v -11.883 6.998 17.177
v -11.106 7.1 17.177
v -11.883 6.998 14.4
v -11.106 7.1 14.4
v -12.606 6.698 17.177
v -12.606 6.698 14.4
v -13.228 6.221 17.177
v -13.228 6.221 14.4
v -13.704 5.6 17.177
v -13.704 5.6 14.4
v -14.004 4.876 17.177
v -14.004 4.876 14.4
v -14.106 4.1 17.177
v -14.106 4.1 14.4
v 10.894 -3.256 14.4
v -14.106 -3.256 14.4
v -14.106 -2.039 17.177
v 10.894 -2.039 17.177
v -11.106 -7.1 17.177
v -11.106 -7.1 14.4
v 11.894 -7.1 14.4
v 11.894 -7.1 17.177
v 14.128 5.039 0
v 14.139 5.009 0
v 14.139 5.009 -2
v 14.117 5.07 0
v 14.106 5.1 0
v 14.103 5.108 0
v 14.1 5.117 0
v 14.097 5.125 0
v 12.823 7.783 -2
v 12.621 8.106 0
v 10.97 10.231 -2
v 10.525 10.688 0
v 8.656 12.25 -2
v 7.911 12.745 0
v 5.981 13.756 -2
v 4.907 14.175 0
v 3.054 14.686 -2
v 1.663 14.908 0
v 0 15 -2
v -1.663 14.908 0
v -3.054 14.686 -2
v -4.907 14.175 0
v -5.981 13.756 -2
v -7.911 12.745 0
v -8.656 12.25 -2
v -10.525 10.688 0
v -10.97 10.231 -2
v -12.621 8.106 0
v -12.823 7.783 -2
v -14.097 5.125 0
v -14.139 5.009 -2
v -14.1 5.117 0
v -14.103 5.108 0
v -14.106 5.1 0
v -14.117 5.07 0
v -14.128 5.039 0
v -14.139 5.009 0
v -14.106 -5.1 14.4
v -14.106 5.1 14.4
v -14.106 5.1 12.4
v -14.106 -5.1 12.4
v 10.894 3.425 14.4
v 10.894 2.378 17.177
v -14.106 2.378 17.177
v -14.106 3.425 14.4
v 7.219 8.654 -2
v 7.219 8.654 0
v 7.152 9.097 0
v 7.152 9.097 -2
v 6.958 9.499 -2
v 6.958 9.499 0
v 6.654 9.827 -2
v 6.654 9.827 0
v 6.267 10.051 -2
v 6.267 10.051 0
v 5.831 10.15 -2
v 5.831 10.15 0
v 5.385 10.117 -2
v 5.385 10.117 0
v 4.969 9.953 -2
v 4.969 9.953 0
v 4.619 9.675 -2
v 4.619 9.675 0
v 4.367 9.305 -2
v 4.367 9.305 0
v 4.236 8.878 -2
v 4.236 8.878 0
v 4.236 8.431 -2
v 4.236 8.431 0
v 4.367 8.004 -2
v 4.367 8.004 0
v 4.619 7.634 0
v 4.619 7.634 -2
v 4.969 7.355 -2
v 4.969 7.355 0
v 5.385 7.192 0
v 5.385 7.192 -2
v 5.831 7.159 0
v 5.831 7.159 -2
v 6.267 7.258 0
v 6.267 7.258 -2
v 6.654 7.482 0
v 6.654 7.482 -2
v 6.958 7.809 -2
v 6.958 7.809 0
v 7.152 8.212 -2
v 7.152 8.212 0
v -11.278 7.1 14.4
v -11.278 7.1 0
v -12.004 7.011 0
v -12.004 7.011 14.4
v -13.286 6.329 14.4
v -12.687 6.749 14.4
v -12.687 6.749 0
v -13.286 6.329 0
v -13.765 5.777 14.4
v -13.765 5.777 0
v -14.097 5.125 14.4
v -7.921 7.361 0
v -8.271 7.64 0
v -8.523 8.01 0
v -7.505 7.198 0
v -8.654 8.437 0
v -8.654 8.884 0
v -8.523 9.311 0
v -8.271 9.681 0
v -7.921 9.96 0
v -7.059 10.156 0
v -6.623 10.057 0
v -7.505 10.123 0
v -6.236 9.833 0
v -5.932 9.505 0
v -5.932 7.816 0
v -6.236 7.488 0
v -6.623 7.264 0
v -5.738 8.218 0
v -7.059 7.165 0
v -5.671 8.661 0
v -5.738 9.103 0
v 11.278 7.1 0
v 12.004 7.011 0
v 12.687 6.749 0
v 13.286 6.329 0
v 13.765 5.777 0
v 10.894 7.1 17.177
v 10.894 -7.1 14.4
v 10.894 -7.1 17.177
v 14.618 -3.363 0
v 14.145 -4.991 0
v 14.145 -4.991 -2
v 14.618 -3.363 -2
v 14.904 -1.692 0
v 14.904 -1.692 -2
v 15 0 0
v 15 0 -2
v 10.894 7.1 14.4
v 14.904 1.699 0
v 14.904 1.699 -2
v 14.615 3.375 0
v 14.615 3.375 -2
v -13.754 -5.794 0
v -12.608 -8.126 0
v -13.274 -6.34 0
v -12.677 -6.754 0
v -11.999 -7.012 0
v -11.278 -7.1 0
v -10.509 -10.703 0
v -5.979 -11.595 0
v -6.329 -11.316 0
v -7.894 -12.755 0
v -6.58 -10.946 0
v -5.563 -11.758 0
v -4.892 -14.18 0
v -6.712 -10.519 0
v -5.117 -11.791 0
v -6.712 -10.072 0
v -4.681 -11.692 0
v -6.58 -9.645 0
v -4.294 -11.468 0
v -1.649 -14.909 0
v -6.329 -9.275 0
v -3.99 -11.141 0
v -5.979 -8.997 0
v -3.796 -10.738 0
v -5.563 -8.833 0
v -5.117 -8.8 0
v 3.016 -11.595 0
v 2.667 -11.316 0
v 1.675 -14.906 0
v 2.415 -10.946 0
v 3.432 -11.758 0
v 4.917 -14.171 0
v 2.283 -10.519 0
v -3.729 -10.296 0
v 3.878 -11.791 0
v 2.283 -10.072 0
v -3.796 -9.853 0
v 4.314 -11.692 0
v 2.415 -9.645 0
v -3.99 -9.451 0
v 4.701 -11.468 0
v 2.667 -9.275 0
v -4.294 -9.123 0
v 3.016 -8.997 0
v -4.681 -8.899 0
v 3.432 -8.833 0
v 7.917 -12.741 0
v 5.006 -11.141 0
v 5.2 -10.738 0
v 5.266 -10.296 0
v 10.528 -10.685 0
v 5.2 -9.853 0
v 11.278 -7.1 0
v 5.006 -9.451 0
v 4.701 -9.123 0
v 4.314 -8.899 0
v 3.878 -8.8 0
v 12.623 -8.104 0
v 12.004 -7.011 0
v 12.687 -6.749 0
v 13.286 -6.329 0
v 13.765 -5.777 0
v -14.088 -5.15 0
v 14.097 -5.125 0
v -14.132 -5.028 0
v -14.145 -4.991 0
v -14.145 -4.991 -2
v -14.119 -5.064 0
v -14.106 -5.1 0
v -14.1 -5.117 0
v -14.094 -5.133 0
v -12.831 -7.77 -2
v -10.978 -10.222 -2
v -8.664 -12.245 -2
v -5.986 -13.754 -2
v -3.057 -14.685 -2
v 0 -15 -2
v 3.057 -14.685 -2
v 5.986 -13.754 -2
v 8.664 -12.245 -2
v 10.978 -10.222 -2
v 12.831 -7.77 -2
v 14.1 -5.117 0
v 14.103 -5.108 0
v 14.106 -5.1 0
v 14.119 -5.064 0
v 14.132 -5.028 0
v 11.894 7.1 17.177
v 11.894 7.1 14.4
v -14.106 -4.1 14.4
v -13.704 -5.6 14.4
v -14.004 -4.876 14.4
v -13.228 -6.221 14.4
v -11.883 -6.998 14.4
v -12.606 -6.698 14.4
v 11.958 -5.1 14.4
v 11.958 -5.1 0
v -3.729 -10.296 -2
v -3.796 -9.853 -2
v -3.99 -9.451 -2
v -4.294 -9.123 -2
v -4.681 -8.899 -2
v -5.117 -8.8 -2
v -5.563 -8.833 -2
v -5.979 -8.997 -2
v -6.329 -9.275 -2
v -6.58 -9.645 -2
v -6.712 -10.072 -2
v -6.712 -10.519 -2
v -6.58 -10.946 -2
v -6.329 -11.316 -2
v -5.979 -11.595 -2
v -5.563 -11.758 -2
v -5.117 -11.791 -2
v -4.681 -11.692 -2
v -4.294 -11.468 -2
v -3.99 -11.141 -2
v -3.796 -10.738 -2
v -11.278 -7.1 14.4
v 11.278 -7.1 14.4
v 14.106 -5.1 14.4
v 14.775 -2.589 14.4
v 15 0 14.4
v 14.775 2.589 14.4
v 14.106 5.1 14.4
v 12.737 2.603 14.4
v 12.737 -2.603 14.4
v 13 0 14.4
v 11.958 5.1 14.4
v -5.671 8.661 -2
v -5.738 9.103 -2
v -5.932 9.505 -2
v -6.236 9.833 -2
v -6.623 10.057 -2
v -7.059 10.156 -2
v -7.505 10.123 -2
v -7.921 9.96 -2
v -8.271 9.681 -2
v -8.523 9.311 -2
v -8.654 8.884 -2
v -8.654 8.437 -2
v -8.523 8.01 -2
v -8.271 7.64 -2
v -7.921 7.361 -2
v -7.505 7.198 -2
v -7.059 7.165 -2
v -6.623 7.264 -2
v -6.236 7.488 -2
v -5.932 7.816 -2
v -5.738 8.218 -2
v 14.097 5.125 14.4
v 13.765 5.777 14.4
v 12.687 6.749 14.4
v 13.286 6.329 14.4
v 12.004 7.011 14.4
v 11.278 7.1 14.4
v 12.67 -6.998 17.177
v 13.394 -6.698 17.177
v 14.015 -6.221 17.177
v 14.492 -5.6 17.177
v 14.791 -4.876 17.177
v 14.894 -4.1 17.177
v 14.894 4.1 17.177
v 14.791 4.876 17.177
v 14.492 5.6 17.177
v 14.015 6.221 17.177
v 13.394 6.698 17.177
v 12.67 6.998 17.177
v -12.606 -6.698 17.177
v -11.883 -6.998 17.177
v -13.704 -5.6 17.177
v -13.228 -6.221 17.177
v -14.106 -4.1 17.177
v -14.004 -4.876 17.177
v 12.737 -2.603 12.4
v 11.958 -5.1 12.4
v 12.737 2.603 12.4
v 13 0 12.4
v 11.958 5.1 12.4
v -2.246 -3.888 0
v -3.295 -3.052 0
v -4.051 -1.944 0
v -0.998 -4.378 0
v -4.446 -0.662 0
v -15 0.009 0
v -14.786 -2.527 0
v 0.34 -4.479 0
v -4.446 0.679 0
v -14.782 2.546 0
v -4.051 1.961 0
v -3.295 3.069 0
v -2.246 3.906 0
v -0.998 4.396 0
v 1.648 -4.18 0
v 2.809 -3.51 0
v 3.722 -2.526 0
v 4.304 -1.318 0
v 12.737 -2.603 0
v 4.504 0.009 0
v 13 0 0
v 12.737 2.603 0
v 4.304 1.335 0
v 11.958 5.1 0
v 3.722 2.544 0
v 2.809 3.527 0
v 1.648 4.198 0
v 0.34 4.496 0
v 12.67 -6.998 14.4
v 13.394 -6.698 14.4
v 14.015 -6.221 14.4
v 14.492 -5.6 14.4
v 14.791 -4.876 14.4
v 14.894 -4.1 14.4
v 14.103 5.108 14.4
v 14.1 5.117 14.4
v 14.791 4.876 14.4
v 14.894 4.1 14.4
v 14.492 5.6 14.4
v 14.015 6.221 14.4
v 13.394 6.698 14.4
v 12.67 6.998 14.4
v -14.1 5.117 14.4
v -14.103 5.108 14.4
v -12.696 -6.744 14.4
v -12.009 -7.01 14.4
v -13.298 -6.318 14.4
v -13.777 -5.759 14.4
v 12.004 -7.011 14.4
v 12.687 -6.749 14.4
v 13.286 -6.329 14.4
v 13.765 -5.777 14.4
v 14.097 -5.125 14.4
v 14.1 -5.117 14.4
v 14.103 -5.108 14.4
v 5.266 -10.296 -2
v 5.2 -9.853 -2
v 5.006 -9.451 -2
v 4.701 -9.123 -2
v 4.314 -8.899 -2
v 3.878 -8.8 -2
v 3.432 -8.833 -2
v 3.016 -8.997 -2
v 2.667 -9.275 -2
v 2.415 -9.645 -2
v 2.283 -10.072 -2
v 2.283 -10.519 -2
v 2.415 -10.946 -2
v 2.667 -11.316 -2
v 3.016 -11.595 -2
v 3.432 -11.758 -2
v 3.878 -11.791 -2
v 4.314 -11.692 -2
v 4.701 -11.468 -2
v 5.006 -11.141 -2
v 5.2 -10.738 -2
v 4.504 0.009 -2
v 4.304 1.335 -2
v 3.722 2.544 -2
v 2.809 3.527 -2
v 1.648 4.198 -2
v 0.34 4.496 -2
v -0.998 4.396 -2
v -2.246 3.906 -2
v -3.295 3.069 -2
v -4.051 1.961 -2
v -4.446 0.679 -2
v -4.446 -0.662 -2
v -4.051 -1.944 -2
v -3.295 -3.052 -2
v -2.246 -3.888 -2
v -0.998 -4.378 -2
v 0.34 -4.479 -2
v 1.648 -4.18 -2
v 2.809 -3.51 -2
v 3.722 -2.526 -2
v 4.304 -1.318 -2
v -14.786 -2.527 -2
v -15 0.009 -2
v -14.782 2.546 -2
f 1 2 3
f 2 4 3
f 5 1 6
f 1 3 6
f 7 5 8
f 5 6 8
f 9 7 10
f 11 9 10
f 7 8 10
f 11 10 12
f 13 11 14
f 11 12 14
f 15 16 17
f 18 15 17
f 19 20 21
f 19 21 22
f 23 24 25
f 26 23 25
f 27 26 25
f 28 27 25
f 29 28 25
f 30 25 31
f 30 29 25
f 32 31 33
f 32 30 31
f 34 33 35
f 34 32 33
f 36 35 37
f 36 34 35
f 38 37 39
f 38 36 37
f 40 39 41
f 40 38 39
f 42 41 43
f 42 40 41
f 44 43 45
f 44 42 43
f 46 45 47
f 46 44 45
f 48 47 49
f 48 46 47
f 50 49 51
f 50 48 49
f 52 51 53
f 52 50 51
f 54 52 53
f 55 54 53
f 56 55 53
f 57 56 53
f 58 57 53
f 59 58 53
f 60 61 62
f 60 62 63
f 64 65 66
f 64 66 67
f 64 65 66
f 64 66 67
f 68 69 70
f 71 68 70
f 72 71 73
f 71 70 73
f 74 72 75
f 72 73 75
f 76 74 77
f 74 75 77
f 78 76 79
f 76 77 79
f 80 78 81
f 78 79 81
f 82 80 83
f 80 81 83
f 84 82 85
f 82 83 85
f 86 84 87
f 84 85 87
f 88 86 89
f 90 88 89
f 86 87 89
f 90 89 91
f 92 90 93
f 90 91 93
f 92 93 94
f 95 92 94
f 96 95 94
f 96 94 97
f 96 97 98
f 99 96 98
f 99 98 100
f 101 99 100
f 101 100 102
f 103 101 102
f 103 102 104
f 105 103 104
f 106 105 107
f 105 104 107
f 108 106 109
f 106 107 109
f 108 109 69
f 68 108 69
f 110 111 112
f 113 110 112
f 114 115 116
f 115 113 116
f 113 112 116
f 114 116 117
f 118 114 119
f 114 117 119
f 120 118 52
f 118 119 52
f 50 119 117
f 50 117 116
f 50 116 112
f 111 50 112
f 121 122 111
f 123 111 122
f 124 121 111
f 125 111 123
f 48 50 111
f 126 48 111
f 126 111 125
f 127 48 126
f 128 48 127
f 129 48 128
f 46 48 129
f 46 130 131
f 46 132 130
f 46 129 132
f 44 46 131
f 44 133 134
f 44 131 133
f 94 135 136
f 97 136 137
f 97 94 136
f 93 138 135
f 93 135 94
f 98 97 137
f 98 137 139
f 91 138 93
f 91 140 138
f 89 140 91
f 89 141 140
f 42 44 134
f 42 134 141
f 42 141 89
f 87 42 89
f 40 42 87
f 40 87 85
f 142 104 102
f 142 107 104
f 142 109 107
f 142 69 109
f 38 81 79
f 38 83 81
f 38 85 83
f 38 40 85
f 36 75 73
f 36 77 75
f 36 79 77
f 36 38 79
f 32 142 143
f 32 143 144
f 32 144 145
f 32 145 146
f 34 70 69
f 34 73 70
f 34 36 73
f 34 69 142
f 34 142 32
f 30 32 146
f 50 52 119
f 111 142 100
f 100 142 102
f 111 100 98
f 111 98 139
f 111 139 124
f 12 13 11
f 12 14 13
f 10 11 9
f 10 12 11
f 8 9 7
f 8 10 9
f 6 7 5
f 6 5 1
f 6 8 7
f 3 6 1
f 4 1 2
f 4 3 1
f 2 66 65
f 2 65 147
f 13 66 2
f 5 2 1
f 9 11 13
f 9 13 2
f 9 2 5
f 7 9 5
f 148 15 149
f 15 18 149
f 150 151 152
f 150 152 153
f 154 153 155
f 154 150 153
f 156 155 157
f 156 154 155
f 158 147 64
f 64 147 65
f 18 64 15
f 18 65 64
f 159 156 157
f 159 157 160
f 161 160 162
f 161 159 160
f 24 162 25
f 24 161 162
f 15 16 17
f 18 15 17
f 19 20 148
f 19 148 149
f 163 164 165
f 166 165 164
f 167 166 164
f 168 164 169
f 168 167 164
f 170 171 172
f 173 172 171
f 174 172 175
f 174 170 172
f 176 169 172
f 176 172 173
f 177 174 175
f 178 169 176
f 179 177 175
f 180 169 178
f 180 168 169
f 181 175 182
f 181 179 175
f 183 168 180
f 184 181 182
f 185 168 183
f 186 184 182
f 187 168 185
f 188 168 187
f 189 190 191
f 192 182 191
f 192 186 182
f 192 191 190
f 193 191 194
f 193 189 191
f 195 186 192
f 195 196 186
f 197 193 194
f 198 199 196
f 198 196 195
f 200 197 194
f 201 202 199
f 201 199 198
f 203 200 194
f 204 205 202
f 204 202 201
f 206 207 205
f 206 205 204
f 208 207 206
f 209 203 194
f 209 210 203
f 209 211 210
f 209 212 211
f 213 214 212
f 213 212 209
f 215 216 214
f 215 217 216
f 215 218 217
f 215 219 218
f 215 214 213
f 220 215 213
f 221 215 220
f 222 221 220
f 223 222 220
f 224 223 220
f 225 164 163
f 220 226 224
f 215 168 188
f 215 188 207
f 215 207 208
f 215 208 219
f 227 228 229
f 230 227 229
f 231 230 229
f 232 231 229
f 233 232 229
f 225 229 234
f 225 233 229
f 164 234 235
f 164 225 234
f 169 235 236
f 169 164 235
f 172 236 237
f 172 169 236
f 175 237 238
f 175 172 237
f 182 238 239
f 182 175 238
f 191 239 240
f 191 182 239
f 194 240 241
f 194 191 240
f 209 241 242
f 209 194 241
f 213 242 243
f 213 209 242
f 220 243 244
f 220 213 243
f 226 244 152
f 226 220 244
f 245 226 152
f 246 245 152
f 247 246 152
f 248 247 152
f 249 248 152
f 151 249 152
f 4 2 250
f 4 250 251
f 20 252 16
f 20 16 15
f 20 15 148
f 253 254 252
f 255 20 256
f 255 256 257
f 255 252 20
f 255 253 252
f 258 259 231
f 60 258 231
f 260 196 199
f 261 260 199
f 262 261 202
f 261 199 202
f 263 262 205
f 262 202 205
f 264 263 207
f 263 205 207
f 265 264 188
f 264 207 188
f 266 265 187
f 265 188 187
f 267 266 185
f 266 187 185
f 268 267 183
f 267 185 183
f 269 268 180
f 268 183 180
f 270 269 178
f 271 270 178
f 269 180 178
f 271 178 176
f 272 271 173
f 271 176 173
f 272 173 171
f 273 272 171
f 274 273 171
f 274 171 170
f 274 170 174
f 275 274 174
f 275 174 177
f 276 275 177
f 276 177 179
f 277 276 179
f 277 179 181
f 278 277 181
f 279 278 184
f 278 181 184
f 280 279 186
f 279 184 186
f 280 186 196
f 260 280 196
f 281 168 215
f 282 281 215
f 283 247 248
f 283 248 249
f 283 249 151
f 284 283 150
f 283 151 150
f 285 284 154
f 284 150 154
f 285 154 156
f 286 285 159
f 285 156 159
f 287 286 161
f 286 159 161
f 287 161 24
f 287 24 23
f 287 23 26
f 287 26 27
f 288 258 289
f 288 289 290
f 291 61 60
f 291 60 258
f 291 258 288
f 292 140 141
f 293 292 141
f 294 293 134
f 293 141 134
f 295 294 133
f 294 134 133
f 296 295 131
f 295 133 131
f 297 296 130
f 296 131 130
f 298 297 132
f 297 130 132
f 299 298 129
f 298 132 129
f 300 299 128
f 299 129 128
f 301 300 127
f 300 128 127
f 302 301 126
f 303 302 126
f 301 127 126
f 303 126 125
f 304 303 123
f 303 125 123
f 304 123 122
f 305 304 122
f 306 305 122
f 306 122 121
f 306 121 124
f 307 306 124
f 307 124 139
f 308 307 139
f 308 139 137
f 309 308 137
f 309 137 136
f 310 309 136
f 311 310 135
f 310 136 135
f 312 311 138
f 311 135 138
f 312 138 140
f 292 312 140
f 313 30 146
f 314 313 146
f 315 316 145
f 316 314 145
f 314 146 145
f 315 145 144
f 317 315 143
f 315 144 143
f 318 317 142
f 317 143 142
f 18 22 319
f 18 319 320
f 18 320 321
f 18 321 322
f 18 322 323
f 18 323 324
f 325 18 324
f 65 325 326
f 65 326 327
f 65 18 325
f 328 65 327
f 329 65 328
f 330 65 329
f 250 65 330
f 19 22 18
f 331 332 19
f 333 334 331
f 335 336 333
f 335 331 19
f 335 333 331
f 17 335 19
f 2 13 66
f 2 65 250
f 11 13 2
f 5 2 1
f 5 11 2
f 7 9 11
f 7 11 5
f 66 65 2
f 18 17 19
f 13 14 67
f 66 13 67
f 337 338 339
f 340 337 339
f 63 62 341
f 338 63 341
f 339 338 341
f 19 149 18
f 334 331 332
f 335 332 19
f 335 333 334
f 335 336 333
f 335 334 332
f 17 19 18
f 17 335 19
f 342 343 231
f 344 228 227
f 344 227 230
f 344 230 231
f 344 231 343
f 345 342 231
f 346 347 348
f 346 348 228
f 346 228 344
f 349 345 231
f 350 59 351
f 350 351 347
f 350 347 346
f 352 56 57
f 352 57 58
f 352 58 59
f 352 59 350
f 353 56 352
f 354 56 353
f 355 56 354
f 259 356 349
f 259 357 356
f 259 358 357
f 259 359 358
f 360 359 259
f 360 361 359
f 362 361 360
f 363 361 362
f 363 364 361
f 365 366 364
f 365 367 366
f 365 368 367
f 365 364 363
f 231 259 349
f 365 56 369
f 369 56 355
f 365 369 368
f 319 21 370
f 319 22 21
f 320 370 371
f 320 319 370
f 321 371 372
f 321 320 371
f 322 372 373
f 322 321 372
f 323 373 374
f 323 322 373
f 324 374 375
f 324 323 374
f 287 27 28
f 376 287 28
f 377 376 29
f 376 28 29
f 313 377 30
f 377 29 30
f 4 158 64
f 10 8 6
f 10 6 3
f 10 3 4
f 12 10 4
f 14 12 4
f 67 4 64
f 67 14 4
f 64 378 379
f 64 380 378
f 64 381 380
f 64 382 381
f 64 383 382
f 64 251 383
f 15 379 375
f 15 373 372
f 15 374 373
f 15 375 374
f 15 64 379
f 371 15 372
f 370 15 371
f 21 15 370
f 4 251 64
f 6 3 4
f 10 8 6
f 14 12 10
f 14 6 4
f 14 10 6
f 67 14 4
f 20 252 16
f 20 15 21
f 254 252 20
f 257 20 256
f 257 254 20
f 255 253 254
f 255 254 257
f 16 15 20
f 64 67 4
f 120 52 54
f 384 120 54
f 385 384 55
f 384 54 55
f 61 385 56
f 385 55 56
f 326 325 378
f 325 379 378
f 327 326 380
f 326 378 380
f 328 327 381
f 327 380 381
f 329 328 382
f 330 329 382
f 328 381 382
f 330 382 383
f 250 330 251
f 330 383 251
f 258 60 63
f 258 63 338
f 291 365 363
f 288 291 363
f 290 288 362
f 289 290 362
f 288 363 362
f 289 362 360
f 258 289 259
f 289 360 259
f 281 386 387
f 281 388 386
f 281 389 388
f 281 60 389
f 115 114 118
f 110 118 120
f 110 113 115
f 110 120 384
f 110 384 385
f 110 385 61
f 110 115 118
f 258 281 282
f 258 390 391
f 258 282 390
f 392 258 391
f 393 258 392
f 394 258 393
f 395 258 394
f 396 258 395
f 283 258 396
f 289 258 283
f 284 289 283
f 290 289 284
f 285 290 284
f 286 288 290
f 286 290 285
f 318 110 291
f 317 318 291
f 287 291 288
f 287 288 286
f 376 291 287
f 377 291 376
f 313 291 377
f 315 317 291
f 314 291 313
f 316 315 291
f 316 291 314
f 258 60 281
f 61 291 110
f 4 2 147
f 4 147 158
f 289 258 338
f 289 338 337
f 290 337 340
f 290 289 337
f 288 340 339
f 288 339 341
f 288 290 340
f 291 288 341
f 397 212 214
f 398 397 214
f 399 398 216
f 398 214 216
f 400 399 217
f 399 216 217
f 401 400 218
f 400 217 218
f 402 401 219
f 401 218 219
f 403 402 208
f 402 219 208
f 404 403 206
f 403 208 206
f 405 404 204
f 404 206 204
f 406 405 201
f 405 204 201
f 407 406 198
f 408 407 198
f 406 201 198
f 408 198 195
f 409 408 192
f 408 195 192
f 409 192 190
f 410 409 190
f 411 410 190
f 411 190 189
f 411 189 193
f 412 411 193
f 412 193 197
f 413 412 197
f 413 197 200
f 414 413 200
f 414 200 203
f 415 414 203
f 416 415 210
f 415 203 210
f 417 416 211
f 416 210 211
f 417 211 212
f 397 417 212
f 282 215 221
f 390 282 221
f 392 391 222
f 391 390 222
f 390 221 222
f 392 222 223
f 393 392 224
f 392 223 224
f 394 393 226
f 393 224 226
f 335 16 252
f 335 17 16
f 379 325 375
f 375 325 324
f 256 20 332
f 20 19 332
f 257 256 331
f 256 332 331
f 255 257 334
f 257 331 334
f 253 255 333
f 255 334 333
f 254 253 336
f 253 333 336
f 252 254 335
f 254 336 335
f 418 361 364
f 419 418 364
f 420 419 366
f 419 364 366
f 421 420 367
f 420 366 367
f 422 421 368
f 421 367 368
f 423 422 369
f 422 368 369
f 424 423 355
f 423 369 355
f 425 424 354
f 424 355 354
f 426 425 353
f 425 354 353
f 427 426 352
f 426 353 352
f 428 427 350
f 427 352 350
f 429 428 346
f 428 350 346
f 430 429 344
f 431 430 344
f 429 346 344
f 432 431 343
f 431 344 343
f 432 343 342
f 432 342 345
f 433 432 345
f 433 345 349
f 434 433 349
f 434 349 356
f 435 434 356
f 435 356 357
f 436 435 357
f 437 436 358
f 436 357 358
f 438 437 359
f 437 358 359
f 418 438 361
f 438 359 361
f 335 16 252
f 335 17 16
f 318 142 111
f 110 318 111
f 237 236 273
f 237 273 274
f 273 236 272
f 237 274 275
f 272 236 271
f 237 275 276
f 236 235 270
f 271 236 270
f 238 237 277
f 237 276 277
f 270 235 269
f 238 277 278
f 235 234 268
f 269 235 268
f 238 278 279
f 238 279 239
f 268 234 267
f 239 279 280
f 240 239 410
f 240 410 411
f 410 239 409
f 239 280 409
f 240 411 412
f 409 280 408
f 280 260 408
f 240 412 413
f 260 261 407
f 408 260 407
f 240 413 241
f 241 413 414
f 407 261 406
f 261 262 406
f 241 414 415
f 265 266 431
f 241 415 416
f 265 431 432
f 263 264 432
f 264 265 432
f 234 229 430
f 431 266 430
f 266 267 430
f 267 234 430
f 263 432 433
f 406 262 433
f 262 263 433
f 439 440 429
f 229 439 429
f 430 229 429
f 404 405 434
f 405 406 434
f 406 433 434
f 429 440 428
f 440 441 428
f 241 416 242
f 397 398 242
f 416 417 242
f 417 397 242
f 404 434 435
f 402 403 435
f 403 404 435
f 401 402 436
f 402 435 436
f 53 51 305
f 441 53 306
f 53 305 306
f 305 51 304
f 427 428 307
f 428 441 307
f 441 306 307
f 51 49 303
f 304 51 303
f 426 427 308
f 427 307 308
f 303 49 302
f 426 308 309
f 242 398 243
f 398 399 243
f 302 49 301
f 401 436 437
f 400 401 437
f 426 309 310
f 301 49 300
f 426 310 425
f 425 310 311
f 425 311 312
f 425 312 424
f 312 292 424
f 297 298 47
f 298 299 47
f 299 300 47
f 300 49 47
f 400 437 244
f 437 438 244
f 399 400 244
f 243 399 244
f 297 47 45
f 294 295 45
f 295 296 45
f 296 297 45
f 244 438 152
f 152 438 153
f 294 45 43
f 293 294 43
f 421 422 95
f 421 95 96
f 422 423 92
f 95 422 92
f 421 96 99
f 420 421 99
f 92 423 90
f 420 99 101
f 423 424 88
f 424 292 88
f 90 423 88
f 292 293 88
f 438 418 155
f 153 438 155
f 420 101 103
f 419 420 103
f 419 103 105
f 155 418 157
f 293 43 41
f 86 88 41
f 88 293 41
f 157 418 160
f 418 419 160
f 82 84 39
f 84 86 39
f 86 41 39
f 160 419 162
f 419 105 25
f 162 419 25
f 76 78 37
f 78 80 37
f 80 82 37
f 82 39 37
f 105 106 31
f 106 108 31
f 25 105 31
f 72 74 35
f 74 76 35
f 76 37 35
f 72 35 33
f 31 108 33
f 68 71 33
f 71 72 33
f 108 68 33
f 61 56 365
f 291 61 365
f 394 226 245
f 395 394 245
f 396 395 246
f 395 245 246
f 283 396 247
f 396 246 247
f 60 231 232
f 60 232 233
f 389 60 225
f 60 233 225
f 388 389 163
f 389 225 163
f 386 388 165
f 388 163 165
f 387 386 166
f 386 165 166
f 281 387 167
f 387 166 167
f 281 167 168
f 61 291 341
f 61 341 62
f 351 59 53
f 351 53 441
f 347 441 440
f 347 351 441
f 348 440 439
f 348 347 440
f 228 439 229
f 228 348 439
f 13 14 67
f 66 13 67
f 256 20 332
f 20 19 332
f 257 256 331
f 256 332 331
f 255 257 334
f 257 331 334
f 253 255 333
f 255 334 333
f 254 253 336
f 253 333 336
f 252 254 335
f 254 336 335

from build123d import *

# Parameters (mm, degrees)
F1_DEPTH    = 14.4
F3_DEPTH    = 2
F5_DEPTH    = 29
F6_DEPTH    = 25
F7_DEPTH    = 25
F8_T1_DEPTH = 25.219195449
F8_T3_DEPTH = 28.5421356237
F8_2_F1_R   = 3
F8_2_F2_R   = 3
F8_2_F3_R   = 3
F8_2_F4_R   = 3
F9_R        = 3
F10_R       = 4.5
F10_R_2     = 1.5
F11_DEPTH   = 2


# Not quite as in the source:
# - a fillet or chamfer that OpenCascade refuses, or shapes differently, is made with other operations: its cross-section is extruded or revolved along the edge and cut away or added
# - after a boolean that leaves OpenCascade's solid faulty, fix() repairs it


with BuildPart() as f1:
    # F0 (on Top) → F1 (new body)
    with BuildSketch(Plane.XY):
        with BuildLine():
            Line((-11.9578426148, -5.1), (-14.1063815346, -5.1))
            Line((-14.1063815346, -5.1), (-14.1063815346, -7.1))
            Line((-14.1063815346, -7.1), (-10.8899035808, -7.1))
            ThreePointArc((-10.8899035808, -7.1), (-11.4675575671, -6.123326175), (-11.9578426148, -5.1))
        make_face()
        with BuildLine():
            Line((14.1063815346, -5.1), (11.9578426148, -5.1))
            ThreePointArc((11.9578426148, -5.1), (11.4675575671, -6.123326175), (10.8899035808, -7.1))
            Line((10.8899035808, -7.1), (13.2132509247, -7.1))
            ThreePointArc((13.2132509247, -7.1), (13.6963710314, -6.1163241062), (14.1063815346, -5.1))
        make_face()
        with BuildLine():
            Line((-10.8899035808, 7.1), (-13.2132509247, 7.1))
            ThreePointArc((-13.2132509247, 7.1), (-13.6963710314, 6.1163241062), (-14.1063815346, 5.1))
            Line((-14.1063815346, 5.1), (-11.9578426148, 5.1))
            ThreePointArc((-11.9578426148, 5.1), (-11.4675575671, 6.123326175), (-10.8899035808, 7.1))
        make_face()
        with BuildLine():
            Line((13.2132509247, 7.1), (10.8899035808, 7.1))
            ThreePointArc((10.8899035808, 7.1), (11.4675575671, 6.123326175), (11.9578426148, 5.1))
            Line((11.9578426148, 5.1), (14.1063815346, 5.1))
            ThreePointArc((14.1063815346, 5.1), (13.6963710314, 6.1163241062), (13.2132509247, 7.1))
        make_face()
        with BuildLine():
            Line((11.9578426148, -5.1), (-11.9578426148, -5.1))
            ThreePointArc((-11.9578426148, -5.1), (-11.4675575671, -6.123326175), (-10.8899035808, -7.1))
            Line((-10.8899035808, -7.1), (10.8899035808, -7.1))
            ThreePointArc((10.8899035808, -7.1), (11.4675575671, -6.123326175), (11.9578426148, -5.1))
        make_face()
        with BuildLine():
            Line((14.1063815346, 5.1), (11.9578426148, 5.1))
            ThreePointArc((11.9578426148, 5.1), (13, 0), (11.9578426148, -5.1))
            Line((11.9578426148, -5.1), (14.1063815346, -5.1))
            ThreePointArc((14.1063815346, -5.1), (15, 0), (14.1063815346, 5.1))
        make_face()
        with BuildLine():
            Line((10.8899035808, 7.1), (-10.8899035808, 7.1))
            ThreePointArc((-10.8899035808, 7.1), (-11.4675575671, 6.123326175), (-11.9578426148, 5.1))
            Line((-11.9578426148, 5.1), (11.9578426148, 5.1))
            ThreePointArc((11.9578426148, 5.1), (11.4675575671, 6.123326175), (10.8899035808, 7.1))
        make_face()
    extrude(amount=F1_DEPTH)

    # F8: fillet of radius 3 on 4 edges, made by hand

    # F8_s2 → F8_t1 (cut)
    with BuildSketch(Plane.XY.offset(-5.4095977245)):
        with BuildLine():
            ThreePointArc((14.0973180073, 5.125), (12.9990458537, 6.5571324751), (11.2778544059, 7.1))
            Line((11.2778544059, 7.1), (13.2132509247, 7.1))
            ThreePointArc((13.2132509247, 7.1), (13.6909440908, 6.1284622787), (14.0973180073, 5.125))
        make_face()
        with BuildLine():
            ThreePointArc((11.2778544059, -7.1), (12.9990458537, -6.5571324751), (14.0973180073, -5.125))
            ThreePointArc((14.0973180073, -5.125), (13.6909440908, -6.1284622787), (13.2132509247, -7.1))
            Line((13.2132509247, -7.1), (11.2778544059, -7.1))
        make_face()
        with BuildLine():
            ThreePointArc((-11.2778544059, 7.1), (-12.9990458537, 6.5571324751), (-14.0973180073, 5.125))
            ThreePointArc((-14.0973180073, 5.125), (-13.6909440908, 6.1284622787), (-13.2132509247, 7.1))
            Line((-13.2132509247, 7.1), (-11.2778544059, 7.1))
        make_face()
    extrude(amount=F8_T1_DEPTH, mode=Mode.SUBTRACT)

    # F8_s4 → F8_t3 (cut)
    with BuildSketch(Plane.XY.offset(-7.0710678119)):
        with BuildLine():
            ThreePointArc((-14.1063815346, -5.1), (-13.0100052174, -6.5494897428), (-11.2779544099, -7.1))
            Line((-11.2779544099, -7.1), (-14.1063815346, -7.1))
            Line((-14.1063815346, -7.1), (-14.1063815346, -5.1))
        make_face()
    extrude(amount=F8_T3_DEPTH, mode=Mode.SUBTRACT)

    # F10 (on Top) → F11 (join)
    with BuildSketch(Plane.XY):
        with BuildLine():
            ThreePointArc((14.1452126344, -4.9912883635), (14.7847588671, -2.5319765485), (15, 0))
            ThreePointArc((15, 0), (14.7831963499, 2.5410835644), (14.1390525758, 5.0087116365))
            Line((14.1390525758, 5.0087116365), (-14.1390525758, 5.0087116365))
            ThreePointArc((-14.1390525758, 5.0087116365), (-14.999997154, 0.0092400861), (-14.1452126344, -4.9912883635))
            Line((-14.1452126344, -4.9912883635), (14.1452126344, -4.9912883635))
        make_face()
        with Locations((0.0035419917, 0.0087116365)):
            Circle(F10_R, mode=Mode.SUBTRACT)
        with BuildLine():
            Line((-14.1390525758, 5.0087116365), (14.1390525758, 5.0087116365))
            ThreePointArc((14.1390525758, 5.0087116365), (0, 15), (-14.1390525758, 5.0087116365))
        make_face()
        with Locations((-7.1710880957, 8.6605090521)):
            Circle(F10_R_2, mode=Mode.SUBTRACT)
        with Locations((5.7189119043, 8.6543741425)):
            Circle(F10_R_2, mode=Mode.SUBTRACT)
        with BuildLine():
            ThreePointArc((-14.1452126344, -4.9912883635), (0, -15), (14.1452126344, -4.9912883635))
            Line((14.1452126344, -4.9912883635), (-14.1452126344, -4.9912883635))
        make_face()
        with Locations((-5.2289596802, -10.2956258575)):
            Circle(F10_R_2, mode=Mode.SUBTRACT)
        with Locations((3.7661575137, -10.2956258575)):
            Circle(F10_R_2, mode=Mode.SUBTRACT)
    extrude(amount=-F11_DEPTH)

    add(f1.part.fix(), mode=Mode.REPLACE)


with BuildPart() as f3:
    # F2 (on face) → F3 (new body)
    with BuildSketch(Plane.XY.offset(14.4)):
        with BuildLine():
            Line((-14.1063815346, 5.1), (-14.1063815346, -5.1))
            Line((-14.1063815346, -5.1), (11.9578426148, -5.1))
            ThreePointArc((11.9578426148, -5.1), (13, 0), (11.9578426148, 5.1))
            Line((11.9578426148, 5.1), (-14.1063815346, 5.1))
        make_face()
    extrude(amount=-F3_DEPTH)


with BuildPart() as f5:
    # F4 (on face) → F5 (new body)
    with BuildSketch(Plane(origin=(-14.1063815346, 0, 0), x_dir=(0, -1, 0), z_dir=(-1, 0, 0))):
        Polygon((5.1, 14.4), (5.4331574369, 14.4), (7.1, 14.4), (7.1, 17.1767032981), (2.039092524, 17.1767032981), (3.2555045802, 14.4), align=None)
        Polygon((-4.7668425631, 14.4), (-3.4248761367, 14.4), (-2.377835637, 17.1767032981), (-7.1, 17.1767032981), (-7.1, 14.4), (-5.1, 14.4), align=None)
        Polygon((-3.4248761367, 14.4), (3.2555045802, 14.4), (2.039092524, 17.1767032981), (-2.377835637, 17.1767032981), align=None)
    extrude(amount=-F5_DEPTH)


with BuildPart() as f6:
    # F4 (on face) → F6 (new body)
    with BuildSketch(Plane(origin=(-14.1063815346, 0, 0), x_dir=(0, -1, 0), z_dir=(-1, 0, 0))):
        Polygon((3.2555045802, 14.4), (5.4331574369, 14.4), (7.1, 14.4), (7.1, 17.1767032981), (2.039092524, 17.1767032981), align=None)
        Polygon((-3.4248761367, 14.4), (3.2555045802, 14.4), (2.039092524, 17.1767032981), (-2.377835637, 17.1767032981), align=None)
        Polygon((-4.7668425631, 14.4), (-3.4248761367, 14.4), (-2.377835637, 17.1767032981), (-7.1, 17.1767032981), (-7.1, 14.4), align=None)
    extrude(amount=-F6_DEPTH)


with BuildPart() as f7_tool:
    # F4 (on face) → F7 (new body)
    with BuildSketch(Plane(origin=(-14.1063815346, 0, 0), x_dir=(0, -1, 0), z_dir=(-1, 0, 0))):
        Polygon((-3.4248761367, 14.4), (3.2555045802, 14.4), (2.039092524, 17.1767032981), (-2.377835637, 17.1767032981), align=None)
    extrude(amount=-F7_DEPTH)


with BuildPart() as f5_1:
    add(f5.part)

    # F7: cut by f7_tool
    add(f7_tool.part, mode=Mode.SUBTRACT)

    # F8#2: fillet of radius 3 on 4 edges, made by hand

    # F8_2_f1
    f8_2_f1_edges = [f5_1.edges().sort_by_distance(p)[0] for p in [
        (-14.1063815346, -7.1, 15.788351649),
    ]]
    fillet(f8_2_f1_edges, radius=F8_2_F1_R)

    # F8_2_f2
    f8_2_f2_edges = [f5_1.edges().sort_by_distance(p)[0] for p in [
        (14.8936184654, -7.1, 15.788351649),
    ]]
    fillet(f8_2_f2_edges, radius=F8_2_F2_R)

    # F8_2_f3
    f8_2_f3_edges = [f5_1.edges().sort_by_distance(p)[0] for p in [
        (14.8936184654, 7.1, 15.788351649),
    ]]
    fillet(f8_2_f3_edges, radius=F8_2_F3_R)

    # F8_2_f4
    f8_2_f4_edges = [f5_1.edges().sort_by_distance(p)[0] for p in [
        (-14.1063815346, 7.1, 15.788351649),
    ]]
    fillet(f8_2_f4_edges, radius=F8_2_F4_R)


with BuildPart() as f6_1:
    add(f6.part)

    # F7: cut by f7_tool
    add(f7_tool.part, mode=Mode.SUBTRACT)

    # F9
    f9_edges = [f6_1.edges().sort_by_distance(p)[0] for p in [
        (-14.106382, 7.1, 15.788352),
        (-14.106382, -7.1, 15.788352),
    ]]
    fillet(f9_edges, radius=F9_R)


solid = Compound([f1.part, f3.part, f5_1.part, f6_1.part])
